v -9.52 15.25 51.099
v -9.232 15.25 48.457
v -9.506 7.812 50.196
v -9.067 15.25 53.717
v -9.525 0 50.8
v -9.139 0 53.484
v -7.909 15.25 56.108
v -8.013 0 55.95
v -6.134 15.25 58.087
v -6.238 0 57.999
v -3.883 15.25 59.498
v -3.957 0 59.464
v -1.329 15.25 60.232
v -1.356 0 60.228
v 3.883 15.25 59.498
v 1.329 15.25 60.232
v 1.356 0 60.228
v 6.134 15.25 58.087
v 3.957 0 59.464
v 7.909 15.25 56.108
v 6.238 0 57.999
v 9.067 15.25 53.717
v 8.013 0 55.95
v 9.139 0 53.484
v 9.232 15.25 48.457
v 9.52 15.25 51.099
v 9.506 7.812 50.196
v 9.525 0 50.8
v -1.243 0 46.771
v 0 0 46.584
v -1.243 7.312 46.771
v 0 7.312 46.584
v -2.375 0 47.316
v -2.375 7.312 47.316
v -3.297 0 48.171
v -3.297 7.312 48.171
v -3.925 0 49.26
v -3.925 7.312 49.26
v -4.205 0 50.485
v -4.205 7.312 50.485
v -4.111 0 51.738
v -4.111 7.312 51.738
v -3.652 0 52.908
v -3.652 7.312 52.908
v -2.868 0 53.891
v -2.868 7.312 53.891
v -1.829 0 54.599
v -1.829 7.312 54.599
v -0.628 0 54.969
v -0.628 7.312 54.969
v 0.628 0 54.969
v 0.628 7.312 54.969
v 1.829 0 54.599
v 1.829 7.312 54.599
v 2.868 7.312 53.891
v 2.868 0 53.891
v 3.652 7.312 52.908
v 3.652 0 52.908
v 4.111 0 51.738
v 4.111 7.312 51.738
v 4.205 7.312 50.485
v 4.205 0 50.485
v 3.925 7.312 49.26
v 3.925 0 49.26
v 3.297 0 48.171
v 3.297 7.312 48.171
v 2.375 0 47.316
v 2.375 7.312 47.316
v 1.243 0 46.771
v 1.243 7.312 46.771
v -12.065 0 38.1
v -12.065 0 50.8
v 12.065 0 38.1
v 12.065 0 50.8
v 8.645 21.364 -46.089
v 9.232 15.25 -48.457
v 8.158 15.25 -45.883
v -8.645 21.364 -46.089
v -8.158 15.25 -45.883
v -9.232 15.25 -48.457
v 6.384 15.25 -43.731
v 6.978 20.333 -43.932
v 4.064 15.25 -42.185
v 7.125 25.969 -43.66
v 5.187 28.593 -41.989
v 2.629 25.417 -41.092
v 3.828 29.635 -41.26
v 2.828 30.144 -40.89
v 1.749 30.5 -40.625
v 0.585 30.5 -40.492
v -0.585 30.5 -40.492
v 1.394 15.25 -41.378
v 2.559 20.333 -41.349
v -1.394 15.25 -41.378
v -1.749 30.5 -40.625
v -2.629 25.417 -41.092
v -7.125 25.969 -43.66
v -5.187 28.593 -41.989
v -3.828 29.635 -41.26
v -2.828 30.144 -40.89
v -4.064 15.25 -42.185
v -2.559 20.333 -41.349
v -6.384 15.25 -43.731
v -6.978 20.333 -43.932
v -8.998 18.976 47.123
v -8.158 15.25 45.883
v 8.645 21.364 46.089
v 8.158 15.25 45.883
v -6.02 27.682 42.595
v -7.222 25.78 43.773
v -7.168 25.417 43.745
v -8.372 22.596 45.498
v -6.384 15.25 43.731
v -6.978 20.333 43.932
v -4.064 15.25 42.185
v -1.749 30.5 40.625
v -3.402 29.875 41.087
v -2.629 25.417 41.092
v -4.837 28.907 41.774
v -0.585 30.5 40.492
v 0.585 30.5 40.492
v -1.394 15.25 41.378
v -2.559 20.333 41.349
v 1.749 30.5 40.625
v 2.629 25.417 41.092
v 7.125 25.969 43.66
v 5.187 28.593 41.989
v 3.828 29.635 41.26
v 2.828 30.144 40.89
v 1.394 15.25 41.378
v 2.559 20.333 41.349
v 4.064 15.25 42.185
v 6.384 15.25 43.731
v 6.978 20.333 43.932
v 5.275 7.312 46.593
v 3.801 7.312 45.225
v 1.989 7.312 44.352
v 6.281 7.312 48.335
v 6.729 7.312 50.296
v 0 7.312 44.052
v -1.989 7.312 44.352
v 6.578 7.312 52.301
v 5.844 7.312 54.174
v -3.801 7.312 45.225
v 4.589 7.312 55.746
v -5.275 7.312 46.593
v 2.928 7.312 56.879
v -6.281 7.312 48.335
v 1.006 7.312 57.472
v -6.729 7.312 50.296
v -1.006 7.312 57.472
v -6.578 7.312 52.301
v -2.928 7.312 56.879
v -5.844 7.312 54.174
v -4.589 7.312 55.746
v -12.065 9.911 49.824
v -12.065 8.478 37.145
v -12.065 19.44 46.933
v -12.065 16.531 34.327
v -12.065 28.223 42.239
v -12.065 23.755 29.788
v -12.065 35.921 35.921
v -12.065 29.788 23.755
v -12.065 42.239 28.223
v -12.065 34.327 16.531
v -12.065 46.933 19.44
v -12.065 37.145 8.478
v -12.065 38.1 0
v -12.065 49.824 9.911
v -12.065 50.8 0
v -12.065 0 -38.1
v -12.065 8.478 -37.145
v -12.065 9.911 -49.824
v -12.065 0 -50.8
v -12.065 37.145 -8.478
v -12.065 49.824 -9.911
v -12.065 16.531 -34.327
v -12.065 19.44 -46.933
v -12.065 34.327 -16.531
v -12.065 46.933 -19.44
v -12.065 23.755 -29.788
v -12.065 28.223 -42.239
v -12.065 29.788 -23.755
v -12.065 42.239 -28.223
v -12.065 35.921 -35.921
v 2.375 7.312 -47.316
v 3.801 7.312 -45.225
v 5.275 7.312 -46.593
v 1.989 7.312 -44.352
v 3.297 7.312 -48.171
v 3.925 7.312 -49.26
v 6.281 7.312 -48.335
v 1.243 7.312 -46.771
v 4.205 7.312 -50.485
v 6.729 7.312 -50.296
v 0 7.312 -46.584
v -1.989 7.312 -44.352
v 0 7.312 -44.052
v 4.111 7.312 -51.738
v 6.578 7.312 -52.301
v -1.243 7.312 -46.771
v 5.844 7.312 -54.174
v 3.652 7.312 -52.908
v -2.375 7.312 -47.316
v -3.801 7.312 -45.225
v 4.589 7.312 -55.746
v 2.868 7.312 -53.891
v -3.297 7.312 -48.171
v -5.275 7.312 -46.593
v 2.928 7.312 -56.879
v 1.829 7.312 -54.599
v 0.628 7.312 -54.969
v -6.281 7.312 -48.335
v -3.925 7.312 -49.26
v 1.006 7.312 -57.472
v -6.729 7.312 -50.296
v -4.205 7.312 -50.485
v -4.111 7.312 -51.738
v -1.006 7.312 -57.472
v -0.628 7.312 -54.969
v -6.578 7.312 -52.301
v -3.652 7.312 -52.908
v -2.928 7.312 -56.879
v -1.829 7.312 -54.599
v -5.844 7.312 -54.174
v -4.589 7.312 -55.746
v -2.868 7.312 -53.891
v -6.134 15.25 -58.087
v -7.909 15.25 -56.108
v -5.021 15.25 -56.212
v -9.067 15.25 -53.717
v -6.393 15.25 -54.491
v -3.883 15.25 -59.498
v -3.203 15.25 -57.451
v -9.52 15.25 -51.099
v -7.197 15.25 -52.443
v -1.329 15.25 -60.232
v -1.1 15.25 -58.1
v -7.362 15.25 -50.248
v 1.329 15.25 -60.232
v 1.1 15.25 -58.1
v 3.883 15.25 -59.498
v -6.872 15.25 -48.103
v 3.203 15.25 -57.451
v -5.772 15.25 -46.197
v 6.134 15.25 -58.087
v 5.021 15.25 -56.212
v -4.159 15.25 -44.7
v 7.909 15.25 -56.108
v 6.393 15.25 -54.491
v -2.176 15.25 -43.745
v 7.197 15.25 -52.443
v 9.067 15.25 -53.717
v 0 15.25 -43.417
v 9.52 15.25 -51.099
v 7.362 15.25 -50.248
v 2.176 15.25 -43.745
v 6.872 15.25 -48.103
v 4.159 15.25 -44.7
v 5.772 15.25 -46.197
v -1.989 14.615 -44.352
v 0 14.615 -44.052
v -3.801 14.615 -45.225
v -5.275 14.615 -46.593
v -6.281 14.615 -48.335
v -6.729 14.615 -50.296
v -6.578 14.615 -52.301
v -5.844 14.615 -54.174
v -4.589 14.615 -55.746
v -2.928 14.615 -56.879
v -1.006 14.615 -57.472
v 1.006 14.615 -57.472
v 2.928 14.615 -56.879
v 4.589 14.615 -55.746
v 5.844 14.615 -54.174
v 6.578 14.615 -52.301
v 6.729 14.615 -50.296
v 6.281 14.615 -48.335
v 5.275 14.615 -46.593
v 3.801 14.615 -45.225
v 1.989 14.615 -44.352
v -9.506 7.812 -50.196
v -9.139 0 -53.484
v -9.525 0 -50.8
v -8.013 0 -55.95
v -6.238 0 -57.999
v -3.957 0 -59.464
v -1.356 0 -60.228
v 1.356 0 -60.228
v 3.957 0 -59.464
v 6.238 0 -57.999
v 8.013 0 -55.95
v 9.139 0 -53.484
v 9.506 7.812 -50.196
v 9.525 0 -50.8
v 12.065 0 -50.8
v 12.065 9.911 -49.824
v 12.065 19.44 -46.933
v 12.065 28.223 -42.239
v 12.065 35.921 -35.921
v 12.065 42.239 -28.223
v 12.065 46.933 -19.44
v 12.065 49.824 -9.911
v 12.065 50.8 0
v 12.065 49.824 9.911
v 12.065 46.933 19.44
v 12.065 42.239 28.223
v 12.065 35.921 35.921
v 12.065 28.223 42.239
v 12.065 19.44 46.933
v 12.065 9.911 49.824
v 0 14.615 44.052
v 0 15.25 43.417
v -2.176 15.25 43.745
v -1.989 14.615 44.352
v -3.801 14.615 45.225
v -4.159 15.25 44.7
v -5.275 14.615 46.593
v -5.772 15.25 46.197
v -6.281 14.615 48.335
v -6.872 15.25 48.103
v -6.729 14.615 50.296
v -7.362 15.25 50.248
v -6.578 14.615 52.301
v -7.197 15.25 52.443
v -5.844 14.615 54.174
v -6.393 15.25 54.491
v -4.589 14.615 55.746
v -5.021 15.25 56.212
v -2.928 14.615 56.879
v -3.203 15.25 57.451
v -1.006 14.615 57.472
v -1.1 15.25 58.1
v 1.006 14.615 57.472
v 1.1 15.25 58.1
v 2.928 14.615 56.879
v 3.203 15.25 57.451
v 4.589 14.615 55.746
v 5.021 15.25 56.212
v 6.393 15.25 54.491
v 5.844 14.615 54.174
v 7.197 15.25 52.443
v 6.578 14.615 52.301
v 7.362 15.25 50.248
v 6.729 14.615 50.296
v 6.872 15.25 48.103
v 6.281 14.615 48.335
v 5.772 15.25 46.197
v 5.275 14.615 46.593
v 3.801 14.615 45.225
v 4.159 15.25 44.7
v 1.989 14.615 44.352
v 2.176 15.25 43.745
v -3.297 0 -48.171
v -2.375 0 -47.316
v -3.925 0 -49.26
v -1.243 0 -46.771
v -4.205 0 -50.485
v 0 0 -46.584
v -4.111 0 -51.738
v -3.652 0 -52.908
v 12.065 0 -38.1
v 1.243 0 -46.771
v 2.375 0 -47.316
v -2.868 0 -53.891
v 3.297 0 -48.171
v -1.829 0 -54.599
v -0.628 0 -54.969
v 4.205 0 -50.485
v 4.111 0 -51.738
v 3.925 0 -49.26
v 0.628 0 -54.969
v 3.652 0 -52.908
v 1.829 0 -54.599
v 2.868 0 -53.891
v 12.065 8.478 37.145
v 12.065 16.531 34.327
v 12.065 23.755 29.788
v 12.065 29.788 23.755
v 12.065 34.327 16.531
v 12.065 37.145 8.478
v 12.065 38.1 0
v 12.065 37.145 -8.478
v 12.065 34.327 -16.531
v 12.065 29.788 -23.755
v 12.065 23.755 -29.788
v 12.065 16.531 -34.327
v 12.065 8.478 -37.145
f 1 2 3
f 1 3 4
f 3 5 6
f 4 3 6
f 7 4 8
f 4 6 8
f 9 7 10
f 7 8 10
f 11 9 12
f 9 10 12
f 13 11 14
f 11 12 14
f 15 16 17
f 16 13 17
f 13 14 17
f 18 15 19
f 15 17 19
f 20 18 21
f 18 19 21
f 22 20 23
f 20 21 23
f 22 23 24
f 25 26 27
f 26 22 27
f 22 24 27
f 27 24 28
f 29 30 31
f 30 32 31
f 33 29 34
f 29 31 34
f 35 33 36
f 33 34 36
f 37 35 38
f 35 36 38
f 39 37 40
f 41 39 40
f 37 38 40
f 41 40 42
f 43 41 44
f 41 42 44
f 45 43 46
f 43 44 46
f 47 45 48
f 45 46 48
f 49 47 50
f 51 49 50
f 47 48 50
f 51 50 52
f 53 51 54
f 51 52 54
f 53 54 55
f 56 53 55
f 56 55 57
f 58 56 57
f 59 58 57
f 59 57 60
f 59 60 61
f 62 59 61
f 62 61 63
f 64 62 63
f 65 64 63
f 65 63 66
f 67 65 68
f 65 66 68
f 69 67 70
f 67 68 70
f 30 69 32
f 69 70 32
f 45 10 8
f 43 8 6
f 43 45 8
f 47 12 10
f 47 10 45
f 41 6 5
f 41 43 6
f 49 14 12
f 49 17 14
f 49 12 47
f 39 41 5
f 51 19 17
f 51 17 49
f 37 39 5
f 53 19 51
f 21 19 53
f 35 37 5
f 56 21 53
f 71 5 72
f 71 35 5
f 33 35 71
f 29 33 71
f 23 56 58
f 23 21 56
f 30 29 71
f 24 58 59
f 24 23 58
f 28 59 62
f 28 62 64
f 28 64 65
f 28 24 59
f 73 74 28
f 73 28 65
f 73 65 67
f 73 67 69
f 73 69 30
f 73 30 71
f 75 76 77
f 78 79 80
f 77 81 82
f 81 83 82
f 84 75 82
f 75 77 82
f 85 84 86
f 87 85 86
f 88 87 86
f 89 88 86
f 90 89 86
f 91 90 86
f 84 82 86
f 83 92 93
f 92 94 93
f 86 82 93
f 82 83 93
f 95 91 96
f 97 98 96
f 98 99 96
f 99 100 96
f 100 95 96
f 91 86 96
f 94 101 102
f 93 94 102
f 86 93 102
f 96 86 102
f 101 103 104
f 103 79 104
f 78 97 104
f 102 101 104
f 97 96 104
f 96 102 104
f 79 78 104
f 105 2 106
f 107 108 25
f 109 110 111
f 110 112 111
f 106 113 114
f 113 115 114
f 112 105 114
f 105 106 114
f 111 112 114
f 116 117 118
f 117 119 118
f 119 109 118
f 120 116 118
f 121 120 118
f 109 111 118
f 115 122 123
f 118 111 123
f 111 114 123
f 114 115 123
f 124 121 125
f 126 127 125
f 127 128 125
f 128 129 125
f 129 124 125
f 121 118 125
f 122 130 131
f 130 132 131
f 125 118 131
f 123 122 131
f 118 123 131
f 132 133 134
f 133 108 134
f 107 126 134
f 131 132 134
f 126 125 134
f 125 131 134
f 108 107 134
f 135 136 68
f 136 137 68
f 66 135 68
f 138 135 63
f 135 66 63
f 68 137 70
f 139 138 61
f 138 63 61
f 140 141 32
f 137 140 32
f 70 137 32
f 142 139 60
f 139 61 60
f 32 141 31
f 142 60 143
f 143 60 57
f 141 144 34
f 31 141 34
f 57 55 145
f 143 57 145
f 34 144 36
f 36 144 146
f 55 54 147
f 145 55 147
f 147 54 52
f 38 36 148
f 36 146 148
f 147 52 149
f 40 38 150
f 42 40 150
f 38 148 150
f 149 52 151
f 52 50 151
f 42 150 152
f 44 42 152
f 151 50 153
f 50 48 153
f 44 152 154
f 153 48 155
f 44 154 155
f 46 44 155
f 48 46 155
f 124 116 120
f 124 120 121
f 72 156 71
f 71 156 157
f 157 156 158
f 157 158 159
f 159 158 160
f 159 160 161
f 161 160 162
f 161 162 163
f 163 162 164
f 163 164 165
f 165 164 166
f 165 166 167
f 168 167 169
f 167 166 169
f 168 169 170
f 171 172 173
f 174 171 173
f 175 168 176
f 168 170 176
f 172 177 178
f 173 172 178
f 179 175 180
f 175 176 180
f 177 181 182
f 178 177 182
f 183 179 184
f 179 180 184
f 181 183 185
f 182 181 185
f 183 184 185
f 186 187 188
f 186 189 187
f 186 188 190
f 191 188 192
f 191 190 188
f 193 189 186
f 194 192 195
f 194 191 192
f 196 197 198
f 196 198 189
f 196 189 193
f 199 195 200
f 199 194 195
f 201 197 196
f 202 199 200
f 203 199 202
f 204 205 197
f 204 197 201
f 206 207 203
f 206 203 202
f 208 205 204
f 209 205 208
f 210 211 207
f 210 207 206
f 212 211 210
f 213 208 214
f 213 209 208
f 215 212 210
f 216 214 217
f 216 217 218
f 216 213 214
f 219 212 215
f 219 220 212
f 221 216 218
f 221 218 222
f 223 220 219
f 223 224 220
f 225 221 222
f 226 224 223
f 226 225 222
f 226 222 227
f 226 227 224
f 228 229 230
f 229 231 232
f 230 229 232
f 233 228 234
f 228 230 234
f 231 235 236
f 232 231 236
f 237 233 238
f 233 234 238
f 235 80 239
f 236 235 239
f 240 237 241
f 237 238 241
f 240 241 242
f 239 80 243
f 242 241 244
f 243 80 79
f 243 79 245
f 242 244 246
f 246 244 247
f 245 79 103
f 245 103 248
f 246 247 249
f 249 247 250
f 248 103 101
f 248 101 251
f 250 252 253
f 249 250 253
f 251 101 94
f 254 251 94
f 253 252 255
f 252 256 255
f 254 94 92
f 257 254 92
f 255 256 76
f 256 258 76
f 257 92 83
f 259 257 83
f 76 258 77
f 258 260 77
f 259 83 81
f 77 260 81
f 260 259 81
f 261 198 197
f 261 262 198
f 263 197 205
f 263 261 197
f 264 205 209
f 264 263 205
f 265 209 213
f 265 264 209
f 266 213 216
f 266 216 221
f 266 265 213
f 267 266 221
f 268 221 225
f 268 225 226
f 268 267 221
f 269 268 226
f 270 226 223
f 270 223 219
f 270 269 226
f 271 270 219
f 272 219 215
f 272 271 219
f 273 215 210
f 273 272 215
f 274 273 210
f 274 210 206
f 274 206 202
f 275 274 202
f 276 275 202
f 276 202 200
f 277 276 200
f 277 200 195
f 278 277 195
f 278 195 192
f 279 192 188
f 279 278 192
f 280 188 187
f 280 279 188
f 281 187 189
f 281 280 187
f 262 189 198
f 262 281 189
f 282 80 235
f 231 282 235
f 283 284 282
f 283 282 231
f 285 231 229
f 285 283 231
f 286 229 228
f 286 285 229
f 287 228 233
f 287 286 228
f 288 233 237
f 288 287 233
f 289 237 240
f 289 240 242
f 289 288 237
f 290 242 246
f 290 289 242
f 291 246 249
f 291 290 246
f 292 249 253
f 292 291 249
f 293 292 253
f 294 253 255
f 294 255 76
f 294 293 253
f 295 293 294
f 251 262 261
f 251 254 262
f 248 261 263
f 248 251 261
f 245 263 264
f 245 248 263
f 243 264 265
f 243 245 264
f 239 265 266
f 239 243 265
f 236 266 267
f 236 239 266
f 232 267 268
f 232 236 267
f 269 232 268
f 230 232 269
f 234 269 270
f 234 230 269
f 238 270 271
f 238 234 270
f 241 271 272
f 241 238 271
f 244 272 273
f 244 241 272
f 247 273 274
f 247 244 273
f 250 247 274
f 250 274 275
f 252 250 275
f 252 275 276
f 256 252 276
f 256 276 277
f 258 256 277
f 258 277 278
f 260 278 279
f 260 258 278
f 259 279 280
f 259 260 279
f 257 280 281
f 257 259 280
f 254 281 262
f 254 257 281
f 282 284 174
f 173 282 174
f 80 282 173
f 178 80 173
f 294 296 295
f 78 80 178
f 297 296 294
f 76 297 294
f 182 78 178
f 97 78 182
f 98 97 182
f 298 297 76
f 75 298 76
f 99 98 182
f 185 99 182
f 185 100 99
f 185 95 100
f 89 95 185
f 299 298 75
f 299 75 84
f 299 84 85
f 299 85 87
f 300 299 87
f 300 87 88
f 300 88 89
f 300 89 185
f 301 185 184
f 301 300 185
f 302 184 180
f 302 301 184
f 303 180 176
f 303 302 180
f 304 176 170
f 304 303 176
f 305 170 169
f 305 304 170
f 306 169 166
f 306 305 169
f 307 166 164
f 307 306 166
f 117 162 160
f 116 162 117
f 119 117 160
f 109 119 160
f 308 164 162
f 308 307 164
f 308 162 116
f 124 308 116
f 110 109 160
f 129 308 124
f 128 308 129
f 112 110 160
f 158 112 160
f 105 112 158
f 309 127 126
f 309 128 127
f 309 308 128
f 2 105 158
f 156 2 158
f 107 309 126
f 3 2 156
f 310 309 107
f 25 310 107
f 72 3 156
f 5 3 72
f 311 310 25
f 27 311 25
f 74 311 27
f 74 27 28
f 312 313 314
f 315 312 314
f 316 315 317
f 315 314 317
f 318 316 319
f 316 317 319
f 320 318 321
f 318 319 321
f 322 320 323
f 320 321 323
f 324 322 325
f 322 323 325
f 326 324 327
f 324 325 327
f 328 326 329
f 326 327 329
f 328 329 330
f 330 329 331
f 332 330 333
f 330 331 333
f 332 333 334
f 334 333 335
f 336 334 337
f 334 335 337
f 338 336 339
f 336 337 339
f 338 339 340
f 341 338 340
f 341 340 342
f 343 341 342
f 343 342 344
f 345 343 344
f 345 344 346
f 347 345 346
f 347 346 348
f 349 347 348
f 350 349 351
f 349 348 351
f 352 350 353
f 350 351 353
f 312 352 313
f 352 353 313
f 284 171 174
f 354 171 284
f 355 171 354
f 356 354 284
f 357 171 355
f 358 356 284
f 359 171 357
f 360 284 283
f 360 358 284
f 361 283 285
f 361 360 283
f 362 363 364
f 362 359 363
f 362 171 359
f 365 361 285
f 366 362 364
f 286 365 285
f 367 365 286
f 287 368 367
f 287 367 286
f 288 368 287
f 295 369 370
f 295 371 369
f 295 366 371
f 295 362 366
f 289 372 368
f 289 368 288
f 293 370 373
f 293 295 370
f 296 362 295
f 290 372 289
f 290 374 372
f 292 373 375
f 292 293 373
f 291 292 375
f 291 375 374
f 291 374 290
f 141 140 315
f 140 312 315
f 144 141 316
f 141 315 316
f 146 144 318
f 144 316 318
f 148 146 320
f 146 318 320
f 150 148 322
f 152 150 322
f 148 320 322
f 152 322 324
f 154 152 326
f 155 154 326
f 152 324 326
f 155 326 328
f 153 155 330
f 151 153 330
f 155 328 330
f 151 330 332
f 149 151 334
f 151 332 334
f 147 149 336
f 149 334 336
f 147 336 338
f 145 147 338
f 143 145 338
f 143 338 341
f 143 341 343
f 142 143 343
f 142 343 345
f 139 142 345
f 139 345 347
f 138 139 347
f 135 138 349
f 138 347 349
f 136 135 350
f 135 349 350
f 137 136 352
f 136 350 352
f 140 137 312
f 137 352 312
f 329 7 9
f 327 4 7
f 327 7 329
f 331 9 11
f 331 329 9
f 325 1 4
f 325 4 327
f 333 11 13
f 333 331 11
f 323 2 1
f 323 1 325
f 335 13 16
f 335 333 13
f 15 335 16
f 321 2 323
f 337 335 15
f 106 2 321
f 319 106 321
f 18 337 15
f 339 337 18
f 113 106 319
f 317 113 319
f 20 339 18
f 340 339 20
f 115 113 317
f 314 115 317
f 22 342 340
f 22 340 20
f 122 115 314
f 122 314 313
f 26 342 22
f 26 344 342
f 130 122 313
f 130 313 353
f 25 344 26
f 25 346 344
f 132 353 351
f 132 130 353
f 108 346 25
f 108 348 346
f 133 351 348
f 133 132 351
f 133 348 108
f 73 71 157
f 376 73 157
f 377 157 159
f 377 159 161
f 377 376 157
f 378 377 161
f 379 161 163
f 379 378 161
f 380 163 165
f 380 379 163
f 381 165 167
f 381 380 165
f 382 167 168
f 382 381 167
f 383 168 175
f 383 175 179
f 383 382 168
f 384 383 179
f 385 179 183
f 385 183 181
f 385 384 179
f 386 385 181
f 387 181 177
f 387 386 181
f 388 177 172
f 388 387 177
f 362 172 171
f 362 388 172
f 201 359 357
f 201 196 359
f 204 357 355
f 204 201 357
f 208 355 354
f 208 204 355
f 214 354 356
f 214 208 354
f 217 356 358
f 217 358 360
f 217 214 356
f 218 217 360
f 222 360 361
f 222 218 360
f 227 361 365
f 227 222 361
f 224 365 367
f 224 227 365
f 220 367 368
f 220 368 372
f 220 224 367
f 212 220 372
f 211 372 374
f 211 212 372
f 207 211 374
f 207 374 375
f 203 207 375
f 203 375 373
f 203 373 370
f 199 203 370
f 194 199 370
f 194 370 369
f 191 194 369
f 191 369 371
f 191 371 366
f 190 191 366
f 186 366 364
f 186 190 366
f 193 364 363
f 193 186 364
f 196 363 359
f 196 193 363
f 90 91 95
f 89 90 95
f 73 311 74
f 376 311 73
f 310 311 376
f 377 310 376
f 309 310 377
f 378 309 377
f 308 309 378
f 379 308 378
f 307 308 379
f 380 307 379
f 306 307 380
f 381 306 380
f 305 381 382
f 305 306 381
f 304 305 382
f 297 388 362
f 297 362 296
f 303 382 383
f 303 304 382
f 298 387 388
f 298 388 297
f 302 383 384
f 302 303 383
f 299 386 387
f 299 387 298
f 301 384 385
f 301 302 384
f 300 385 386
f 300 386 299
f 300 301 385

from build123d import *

# Parameters (mm, degrees)
BOSS_EXTRUDE1_DEPTH     = 12.065
SKETCH6_R               = 9.525
BOSS_EXTRUDE2_DEPTH     = 15.25
CUT_EXTRUDE2_START      = -15.25
SKETCH6_7_R             = 9.525
CUT_EXTRUDE2_DEPTH      = 15.25
CUT_EXTRUDE2_DRAFT      = 3
MIRROR2_START           = -15.25
MIRROR2_COPY_1_SKETCH_R = 9.525
MIRROR2_COPY_1_DEPTH    = 15.25
MIRROR2_COPY_1_DRAFT    = 3


with BuildPart() as part:
    # Sketch2 → Boss-Extrude1 (new, symmetric)
    with BuildSketch(Plane(origin=(0, 0, 0), x_dir=(0, 0, -1), z_dir=(1, 0, 0))):
        with BuildLine():
            Line((-50.8, 0), (-38.1, 0))
            ThreePointArc((-38.1, 0), (0, 38.1), (38.1, 0))
            Line((38.1, 0), (50.8, 0))
            ThreePointArc((50.8, 0), (0, 50.8), (-50.8, 0))
        make_face()
    extrude(amount=BOSS_EXTRUDE1_DEPTH, both=True)

    # Sketch6 → Boss-Extrude2 (add)
    with BuildSketch(Plane.XZ):
        with Locations((0, -50.8)):
            Circle(SKETCH6_R)
    boss_extrude2 = extrude(amount=-BOSS_EXTRUDE2_DEPTH)


with BuildPart() as cut_extrude2_tool:
    # Sketch6<7> → Cut-Extrude2 (with draft: the straight prism first)
    with BuildSketch(Plane.XZ.offset(CUT_EXTRUDE2_START)):
        with Locations((0, -50.8)):
            Circle(SKETCH6_7_R)
    extrude(amount=-CUT_EXTRUDE2_DEPTH)
    # Cut-Extrude2: the draft: its side faces are tilted about the plane it starts from
    cut_extrude2_sides = [cut_extrude2_tool.faces().sort_by_distance(p)[0] for p in [
        (-9.525, 22.875, -50.8),
    ]]
    draft(cut_extrude2_sides, Plane.XZ.offset(CUT_EXTRUDE2_START), CUT_EXTRUDE2_DRAFT)


with BuildPart() as part_1:
    add(part.part)

    # Cut-Extrude2: cut by cut_extrude2_tool
    add(cut_extrude2_tool.part, mode=Mode.SUBTRACT)

    # Sketch15 → CBORE for 5/16 Socket Head Cap Screw1 (revolve, cut)
    with BuildSketch(Plane(origin=(0, 15.25, -50.8), x_dir=(0, 0, 1), z_dir=(1, 0, 0))):
        Polygon((0, 0), (0, 15.25), (4.2164, 15.25), (4.2164, 7.9375), (6.74751, 7.9375), (6.74751, 0.635), (7.38251, 0), align=None)
    cbore_for_5_16_socket_head_cap_screw1 = revolve(axis=Axis((0, 21.6, -50.8), (0, -1, 0)), mode=Mode.SUBTRACT)

    # Mirror2: Boss-Extrude2, CBORE for 5/16 Socket Head Cap Screw1 across plane
    add(boss_extrude2.mirror(Plane.XY))
    add(cbore_for_5_16_socket_head_cap_screw1.mirror(Plane.XY), mode=Mode.SUBTRACT)


with BuildPart() as mirror2_copy_1_tool:
    # Mirror2 copy 1 sketch → Mirror2 copy 1 (with draft: the straight prism first)
    with BuildSketch(Plane.XZ.offset(MIRROR2_START)):
        with Locations((0, 50.8)):
            Circle(MIRROR2_COPY_1_SKETCH_R)
    extrude(amount=-MIRROR2_COPY_1_DEPTH)
    # Mirror2 copy 1: the draft: its side faces are tilted about the plane it starts from
    mirror2_copy_1_sides = [mirror2_copy_1_tool.faces().sort_by_distance(p)[0] for p in [
        (-9.525, 22.875, 50.8),
    ]]
    draft(mirror2_copy_1_sides, Plane.XZ.offset(MIRROR2_START), MIRROR2_COPY_1_DRAFT)


with BuildPart() as part_2:
    add(part_1.part)

    # Mirror2 copy 1: cut by mirror2_copy_1_tool
    add(mirror2_copy_1_tool.part, mode=Mode.SUBTRACT)


solid = part_2.part
